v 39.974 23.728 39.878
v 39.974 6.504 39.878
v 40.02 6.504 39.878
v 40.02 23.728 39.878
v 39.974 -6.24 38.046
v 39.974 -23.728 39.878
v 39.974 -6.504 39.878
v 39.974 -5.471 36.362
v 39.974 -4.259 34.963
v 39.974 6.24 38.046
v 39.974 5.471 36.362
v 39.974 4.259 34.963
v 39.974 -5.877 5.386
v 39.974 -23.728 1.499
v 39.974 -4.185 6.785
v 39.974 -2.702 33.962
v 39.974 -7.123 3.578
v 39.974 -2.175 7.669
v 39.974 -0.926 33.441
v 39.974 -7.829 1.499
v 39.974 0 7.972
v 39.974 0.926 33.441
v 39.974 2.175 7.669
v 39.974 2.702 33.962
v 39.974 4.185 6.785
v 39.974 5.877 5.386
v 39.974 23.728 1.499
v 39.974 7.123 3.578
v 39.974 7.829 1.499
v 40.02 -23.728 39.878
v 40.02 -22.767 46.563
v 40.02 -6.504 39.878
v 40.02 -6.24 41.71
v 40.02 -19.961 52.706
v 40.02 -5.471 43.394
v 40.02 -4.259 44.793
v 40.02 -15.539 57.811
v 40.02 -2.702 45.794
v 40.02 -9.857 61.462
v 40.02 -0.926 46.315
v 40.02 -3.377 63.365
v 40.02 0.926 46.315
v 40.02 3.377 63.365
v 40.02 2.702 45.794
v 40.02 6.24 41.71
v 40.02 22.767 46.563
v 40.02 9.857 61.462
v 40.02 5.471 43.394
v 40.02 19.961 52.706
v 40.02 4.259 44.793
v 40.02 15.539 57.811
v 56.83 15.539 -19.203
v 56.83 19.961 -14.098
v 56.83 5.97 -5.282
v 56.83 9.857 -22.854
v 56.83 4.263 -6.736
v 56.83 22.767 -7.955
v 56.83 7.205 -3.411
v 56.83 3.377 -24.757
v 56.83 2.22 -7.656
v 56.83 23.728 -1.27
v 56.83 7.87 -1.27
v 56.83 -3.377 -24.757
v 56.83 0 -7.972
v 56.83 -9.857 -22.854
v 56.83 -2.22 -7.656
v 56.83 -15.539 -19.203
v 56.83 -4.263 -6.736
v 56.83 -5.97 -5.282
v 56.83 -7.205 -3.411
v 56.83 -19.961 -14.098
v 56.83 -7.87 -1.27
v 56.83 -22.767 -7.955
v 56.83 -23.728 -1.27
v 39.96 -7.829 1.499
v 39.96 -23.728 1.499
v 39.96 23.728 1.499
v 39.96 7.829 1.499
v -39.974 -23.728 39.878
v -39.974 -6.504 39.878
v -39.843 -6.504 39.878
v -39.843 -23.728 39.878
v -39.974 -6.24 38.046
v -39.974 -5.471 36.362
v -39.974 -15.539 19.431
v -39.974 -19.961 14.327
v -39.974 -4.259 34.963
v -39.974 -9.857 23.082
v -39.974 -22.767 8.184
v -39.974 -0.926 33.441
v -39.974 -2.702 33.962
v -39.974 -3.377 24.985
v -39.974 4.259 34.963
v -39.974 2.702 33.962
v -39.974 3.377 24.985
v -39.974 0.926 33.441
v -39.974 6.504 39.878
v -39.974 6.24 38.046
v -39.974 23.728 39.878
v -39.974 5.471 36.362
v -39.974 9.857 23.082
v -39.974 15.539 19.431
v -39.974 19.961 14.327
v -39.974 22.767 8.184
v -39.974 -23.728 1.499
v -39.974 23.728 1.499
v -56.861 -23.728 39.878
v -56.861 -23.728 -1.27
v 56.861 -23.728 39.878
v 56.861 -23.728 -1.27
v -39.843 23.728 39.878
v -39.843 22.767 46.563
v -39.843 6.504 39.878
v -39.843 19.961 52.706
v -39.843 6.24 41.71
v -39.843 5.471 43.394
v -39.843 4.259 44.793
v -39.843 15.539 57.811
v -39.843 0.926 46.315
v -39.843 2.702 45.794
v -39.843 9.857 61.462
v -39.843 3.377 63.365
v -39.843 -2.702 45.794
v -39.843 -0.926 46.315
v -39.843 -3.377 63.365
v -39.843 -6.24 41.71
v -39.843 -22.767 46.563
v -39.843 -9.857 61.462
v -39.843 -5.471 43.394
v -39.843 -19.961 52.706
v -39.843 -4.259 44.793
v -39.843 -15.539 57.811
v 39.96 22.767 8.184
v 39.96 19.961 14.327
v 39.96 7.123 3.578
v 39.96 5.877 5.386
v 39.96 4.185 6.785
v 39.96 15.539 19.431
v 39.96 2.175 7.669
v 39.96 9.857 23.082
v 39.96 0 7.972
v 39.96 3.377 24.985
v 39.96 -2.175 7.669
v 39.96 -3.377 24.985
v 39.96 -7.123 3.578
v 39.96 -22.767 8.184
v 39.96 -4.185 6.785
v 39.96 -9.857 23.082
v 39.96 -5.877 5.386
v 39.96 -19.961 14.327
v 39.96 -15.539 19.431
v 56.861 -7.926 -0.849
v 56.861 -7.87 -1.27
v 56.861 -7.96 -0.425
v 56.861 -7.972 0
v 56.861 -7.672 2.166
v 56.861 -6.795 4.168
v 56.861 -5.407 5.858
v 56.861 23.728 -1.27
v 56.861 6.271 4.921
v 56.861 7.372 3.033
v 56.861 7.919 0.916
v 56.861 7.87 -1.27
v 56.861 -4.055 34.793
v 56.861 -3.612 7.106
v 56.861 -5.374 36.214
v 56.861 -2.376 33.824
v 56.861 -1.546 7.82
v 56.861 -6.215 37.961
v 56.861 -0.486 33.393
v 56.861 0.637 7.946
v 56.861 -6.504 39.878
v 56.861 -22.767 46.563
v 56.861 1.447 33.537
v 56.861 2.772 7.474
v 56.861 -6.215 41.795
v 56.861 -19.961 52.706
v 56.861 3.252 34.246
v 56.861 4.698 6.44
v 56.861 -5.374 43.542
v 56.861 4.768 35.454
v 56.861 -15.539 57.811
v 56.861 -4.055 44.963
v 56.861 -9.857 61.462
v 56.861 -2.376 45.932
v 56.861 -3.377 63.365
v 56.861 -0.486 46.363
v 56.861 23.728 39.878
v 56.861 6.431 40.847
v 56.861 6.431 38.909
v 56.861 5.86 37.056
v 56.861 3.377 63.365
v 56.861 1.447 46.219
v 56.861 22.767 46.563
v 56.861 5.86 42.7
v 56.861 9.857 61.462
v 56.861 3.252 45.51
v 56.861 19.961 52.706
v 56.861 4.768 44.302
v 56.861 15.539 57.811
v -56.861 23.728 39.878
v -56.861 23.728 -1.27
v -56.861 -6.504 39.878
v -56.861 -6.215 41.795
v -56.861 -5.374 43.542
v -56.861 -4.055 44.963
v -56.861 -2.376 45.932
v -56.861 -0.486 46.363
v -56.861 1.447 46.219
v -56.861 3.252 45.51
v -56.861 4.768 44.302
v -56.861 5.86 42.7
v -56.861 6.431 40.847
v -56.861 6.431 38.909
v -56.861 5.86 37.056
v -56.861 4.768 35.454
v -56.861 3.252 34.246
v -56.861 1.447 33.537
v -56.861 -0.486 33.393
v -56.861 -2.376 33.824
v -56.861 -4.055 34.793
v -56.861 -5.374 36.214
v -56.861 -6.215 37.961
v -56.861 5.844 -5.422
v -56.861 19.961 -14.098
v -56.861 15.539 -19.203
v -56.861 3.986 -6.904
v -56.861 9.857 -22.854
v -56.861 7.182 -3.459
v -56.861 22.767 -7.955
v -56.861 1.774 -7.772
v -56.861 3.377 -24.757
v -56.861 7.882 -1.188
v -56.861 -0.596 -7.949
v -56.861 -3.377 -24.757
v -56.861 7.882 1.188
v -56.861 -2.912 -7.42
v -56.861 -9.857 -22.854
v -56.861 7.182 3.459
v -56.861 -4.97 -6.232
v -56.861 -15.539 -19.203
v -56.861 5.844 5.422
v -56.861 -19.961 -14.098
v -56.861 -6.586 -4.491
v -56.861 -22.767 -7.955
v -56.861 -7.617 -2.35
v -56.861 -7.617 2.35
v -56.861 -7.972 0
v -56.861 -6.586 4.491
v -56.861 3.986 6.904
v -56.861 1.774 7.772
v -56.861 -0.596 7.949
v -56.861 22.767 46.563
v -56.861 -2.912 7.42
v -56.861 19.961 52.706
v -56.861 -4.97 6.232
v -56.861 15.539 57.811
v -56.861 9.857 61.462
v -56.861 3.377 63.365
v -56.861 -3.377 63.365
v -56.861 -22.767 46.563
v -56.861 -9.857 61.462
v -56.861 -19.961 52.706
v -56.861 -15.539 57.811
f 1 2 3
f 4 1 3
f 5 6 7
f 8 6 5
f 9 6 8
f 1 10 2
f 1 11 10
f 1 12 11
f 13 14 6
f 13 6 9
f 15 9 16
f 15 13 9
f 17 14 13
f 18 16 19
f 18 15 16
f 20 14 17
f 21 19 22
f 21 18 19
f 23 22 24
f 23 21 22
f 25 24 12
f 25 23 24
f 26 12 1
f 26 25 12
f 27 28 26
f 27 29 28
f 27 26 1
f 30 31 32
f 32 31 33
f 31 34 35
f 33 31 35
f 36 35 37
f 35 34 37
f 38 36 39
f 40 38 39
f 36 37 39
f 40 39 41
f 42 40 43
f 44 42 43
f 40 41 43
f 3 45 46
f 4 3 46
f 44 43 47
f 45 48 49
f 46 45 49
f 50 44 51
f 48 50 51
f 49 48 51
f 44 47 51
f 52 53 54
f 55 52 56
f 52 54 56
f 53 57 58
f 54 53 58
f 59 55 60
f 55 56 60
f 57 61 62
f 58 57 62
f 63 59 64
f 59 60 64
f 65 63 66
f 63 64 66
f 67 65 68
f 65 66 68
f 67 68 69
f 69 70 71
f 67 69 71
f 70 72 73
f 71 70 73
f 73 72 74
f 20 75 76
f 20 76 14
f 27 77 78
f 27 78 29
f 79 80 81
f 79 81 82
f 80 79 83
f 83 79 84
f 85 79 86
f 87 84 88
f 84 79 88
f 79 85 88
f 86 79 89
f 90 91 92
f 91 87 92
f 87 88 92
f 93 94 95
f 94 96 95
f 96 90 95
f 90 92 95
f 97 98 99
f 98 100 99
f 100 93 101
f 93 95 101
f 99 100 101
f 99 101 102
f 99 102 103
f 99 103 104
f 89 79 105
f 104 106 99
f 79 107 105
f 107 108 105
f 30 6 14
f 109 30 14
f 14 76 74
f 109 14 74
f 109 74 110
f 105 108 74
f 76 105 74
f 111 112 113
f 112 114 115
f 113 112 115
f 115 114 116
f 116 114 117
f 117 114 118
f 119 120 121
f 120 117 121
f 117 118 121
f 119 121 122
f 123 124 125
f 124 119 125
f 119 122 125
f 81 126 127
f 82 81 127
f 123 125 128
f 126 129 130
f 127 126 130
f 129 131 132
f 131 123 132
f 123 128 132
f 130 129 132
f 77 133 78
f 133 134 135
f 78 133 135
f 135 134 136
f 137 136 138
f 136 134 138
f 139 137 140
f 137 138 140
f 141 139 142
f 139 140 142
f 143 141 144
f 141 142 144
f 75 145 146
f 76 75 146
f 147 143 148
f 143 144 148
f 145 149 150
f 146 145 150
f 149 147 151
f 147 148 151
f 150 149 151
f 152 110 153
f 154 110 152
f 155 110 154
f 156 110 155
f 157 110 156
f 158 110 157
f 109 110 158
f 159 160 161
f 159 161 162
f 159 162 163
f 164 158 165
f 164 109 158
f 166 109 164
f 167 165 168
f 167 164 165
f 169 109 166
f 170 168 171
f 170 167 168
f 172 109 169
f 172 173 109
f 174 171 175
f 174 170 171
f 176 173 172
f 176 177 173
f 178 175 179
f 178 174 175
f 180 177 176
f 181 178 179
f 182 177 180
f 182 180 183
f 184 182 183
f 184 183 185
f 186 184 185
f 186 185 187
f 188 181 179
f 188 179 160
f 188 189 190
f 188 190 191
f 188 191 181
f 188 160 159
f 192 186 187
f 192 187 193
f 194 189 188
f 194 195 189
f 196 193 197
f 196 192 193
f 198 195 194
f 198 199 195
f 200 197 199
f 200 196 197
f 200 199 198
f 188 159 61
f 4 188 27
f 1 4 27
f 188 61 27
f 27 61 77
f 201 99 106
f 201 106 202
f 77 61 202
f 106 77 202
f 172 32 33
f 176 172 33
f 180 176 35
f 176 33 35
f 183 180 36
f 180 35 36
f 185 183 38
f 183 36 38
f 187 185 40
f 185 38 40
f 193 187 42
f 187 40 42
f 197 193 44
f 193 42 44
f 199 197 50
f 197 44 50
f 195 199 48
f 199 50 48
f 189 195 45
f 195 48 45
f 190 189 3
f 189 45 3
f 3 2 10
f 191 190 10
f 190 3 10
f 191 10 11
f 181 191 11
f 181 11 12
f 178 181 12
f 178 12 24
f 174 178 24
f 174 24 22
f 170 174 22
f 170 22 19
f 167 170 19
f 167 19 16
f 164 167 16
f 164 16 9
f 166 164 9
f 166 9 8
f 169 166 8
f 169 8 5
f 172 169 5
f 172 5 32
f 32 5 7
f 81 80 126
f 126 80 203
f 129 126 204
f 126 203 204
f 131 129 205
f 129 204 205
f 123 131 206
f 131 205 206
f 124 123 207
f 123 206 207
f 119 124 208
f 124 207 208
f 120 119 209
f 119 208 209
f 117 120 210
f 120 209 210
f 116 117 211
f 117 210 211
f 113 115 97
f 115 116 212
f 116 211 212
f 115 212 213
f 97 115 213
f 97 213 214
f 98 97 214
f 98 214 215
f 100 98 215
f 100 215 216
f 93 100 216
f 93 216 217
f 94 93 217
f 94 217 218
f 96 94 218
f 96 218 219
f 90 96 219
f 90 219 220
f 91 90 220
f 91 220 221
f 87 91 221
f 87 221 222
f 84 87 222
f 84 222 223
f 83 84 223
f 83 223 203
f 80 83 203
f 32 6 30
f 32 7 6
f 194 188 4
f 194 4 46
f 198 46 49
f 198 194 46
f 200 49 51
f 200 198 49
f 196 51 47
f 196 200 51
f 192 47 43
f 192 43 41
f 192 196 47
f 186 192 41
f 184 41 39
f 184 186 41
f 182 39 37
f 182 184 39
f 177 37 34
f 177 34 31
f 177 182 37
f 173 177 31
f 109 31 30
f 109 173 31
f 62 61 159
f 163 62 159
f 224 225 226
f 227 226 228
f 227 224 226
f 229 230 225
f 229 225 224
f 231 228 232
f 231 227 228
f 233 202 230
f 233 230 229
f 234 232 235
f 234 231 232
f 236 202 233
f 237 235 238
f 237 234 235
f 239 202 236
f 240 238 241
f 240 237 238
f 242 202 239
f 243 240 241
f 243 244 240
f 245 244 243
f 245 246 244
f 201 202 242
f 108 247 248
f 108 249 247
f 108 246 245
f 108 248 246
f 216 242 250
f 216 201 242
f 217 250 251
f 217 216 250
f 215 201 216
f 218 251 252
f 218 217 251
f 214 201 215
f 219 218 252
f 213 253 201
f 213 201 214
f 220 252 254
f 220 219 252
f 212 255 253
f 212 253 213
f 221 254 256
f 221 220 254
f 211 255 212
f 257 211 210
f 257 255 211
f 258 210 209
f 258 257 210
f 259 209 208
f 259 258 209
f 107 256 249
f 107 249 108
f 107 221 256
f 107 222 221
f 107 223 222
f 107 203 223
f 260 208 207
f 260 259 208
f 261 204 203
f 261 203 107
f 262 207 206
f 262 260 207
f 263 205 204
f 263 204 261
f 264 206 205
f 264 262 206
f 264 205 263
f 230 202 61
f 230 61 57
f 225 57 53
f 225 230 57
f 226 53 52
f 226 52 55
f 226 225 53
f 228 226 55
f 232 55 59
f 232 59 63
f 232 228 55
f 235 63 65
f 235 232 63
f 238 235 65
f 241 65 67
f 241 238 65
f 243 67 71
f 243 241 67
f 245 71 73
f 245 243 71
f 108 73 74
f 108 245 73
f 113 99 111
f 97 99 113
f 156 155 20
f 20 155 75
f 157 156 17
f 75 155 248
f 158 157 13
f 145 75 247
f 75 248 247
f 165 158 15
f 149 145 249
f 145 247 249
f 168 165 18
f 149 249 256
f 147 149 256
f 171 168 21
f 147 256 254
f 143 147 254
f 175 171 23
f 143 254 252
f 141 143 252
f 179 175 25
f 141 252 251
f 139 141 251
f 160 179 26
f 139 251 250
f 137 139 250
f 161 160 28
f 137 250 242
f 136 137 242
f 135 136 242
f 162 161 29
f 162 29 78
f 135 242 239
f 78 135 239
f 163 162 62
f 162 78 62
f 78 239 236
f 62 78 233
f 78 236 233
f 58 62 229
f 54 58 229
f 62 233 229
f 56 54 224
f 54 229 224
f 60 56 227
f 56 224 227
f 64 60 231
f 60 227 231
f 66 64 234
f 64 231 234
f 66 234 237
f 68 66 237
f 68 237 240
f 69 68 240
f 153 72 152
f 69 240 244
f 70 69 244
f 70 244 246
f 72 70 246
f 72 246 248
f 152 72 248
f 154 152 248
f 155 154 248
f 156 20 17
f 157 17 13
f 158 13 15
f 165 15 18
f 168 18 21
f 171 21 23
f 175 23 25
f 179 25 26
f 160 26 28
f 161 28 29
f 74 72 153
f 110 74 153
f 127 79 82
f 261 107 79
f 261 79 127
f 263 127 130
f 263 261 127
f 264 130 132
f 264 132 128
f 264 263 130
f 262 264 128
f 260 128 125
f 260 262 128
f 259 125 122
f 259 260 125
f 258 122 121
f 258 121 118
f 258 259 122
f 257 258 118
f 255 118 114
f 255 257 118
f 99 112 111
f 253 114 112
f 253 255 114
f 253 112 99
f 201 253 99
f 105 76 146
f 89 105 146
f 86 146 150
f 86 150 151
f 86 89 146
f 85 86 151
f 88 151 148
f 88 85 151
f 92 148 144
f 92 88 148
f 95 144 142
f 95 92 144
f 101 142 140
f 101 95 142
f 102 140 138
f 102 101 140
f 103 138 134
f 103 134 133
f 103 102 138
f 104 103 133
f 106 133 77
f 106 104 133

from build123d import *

# Parameters (mm, degrees)
F0_W      = 17.3620246351
F0_H      = 23.728100583
F1_DEPTH  = 1.27
F3_DEPTH  = 113.6904
F4_W      = 79.9476280808
F4_H      = 47.4562011659
F5_DEPTH  = 1.4986
F7_DEPTH  = 79.9338
F8_DEPTH  = 39.878
F10_DEPTH = 17.018
F12_DEPTH = 16.8402
F13_R     = 6.5036466471
F14_DEPTH = 198.628
F15_R     = 7.9715135089
F16_DEPTH = 343.916


with BuildPart() as f1:
    # F0 (on Top) → F1 (new body)
    with BuildSketch(Plane.XY):
        with Locations((-48.1796208769, 11.8640502915)):
            Rectangle(F0_W, F0_H)
        with Locations((-48.1796208769, -11.8640502915)):
            Rectangle(F0_W, F0_H)
        Polygon((39.4986085594, 0), (39.4986085594, 23.728100583), (-39.4986085594, 23.728100583), (-39.4986085594, 0), (-39.4986085594, -23.728100583), (39.4986085594, -23.728100583), align=None)
        with Locations((48.1796208769, 11.8640502915)):
            Rectangle(F0_W, F0_H)
        with Locations((48.1796208769, -11.8640502915)):
            Rectangle(F0_W, F0_H)
    extrude(amount=-F1_DEPTH)

    # F2 (on face) → F3 (join)
    with BuildSketch(Plane(origin=(-56.8606331944, 0, 0), x_dir=(0, -1, 0), z_dir=(-1, 0, 0))):
        with BuildLine():
            Line((23.728100583, -1.27), (-23.728100583, -1.27))
            ThreePointArc((-23.728100583, -1.27), (0, -24.998100583), (23.728100583, -1.27))
        make_face()
    extrude(amount=-F3_DEPTH)

    # F4 (on face) → F5 (join)
    with BuildSketch(Plane.XY):
        Rectangle(F4_W, F4_H)
    extrude(amount=F5_DEPTH)

    # F6 (on face) → F7 (join)
    with BuildSketch(Plane(origin=(-39.9738140404, 0, 0), x_dir=(0, -1, 0), z_dir=(-1, 0, 0))):
        with BuildLine():
            Line((-23.728100583, 1.4986), (23.728100583, 1.4986))
            ThreePointArc((23.728100583, 1.4986), (0, 25.226700583), (-23.728100583, 1.4986))
        make_face()
    extrude(amount=-F7_DEPTH)

    # F8 (add): faces of the model
    f8_faces = [f1.faces().sort_by_distance(p)[0] for p in [
        (-48.4172236174, 0, 0),
        (48.4172236174, 0, 0),
    ]]
    extrude(f8_faces, amount=F8_DEPTH)

    # F9 (on face) → F10 (join)
    with BuildSketch(Plane(origin=(-56.8606331944, 0, 0), x_dir=(0, -1, 0), z_dir=(-1, 0, 0))):
        with BuildLine():
            Line((-23.728100583, 39.878), (23.728100583, 39.878))
            ThreePointArc((23.728100583, 39.878), (0, 63.606100583), (-23.728100583, 39.878))
        make_face()
    extrude(amount=-F10_DEPTH)

    # F11 (on face) → F12 (join)
    with BuildSketch(Plane.YZ.offset(56.8606331944)):
        with BuildLine():
            Line((-23.728100583, 39.878), (23.728100583, 39.878))
            ThreePointArc((23.728100583, 39.878), (0, 63.606100583), (-23.728100583, 39.878))
        make_face()
    extrude(amount=-F12_DEPTH)

    # F13 (on face) → F14 (cut)
    with BuildSketch(Plane(origin=(-56.8606331944, 0, 0), x_dir=(0, -1, 0), z_dir=(-1, 0, 0))):
        with Locations((0, 39.878)):
            Circle(F13_R)
    extrude(amount=-F14_DEPTH, mode=Mode.SUBTRACT)

    # F15 (on face) → F16 (cut)
    with BuildSketch(Plane(origin=(-56.8606331944, 0, 0), x_dir=(0, -1, 0), z_dir=(-1, 0, 0))):
        Circle(F15_R)
    extrude(amount=-F16_DEPTH, mode=Mode.SUBTRACT)


solid = f1.part
